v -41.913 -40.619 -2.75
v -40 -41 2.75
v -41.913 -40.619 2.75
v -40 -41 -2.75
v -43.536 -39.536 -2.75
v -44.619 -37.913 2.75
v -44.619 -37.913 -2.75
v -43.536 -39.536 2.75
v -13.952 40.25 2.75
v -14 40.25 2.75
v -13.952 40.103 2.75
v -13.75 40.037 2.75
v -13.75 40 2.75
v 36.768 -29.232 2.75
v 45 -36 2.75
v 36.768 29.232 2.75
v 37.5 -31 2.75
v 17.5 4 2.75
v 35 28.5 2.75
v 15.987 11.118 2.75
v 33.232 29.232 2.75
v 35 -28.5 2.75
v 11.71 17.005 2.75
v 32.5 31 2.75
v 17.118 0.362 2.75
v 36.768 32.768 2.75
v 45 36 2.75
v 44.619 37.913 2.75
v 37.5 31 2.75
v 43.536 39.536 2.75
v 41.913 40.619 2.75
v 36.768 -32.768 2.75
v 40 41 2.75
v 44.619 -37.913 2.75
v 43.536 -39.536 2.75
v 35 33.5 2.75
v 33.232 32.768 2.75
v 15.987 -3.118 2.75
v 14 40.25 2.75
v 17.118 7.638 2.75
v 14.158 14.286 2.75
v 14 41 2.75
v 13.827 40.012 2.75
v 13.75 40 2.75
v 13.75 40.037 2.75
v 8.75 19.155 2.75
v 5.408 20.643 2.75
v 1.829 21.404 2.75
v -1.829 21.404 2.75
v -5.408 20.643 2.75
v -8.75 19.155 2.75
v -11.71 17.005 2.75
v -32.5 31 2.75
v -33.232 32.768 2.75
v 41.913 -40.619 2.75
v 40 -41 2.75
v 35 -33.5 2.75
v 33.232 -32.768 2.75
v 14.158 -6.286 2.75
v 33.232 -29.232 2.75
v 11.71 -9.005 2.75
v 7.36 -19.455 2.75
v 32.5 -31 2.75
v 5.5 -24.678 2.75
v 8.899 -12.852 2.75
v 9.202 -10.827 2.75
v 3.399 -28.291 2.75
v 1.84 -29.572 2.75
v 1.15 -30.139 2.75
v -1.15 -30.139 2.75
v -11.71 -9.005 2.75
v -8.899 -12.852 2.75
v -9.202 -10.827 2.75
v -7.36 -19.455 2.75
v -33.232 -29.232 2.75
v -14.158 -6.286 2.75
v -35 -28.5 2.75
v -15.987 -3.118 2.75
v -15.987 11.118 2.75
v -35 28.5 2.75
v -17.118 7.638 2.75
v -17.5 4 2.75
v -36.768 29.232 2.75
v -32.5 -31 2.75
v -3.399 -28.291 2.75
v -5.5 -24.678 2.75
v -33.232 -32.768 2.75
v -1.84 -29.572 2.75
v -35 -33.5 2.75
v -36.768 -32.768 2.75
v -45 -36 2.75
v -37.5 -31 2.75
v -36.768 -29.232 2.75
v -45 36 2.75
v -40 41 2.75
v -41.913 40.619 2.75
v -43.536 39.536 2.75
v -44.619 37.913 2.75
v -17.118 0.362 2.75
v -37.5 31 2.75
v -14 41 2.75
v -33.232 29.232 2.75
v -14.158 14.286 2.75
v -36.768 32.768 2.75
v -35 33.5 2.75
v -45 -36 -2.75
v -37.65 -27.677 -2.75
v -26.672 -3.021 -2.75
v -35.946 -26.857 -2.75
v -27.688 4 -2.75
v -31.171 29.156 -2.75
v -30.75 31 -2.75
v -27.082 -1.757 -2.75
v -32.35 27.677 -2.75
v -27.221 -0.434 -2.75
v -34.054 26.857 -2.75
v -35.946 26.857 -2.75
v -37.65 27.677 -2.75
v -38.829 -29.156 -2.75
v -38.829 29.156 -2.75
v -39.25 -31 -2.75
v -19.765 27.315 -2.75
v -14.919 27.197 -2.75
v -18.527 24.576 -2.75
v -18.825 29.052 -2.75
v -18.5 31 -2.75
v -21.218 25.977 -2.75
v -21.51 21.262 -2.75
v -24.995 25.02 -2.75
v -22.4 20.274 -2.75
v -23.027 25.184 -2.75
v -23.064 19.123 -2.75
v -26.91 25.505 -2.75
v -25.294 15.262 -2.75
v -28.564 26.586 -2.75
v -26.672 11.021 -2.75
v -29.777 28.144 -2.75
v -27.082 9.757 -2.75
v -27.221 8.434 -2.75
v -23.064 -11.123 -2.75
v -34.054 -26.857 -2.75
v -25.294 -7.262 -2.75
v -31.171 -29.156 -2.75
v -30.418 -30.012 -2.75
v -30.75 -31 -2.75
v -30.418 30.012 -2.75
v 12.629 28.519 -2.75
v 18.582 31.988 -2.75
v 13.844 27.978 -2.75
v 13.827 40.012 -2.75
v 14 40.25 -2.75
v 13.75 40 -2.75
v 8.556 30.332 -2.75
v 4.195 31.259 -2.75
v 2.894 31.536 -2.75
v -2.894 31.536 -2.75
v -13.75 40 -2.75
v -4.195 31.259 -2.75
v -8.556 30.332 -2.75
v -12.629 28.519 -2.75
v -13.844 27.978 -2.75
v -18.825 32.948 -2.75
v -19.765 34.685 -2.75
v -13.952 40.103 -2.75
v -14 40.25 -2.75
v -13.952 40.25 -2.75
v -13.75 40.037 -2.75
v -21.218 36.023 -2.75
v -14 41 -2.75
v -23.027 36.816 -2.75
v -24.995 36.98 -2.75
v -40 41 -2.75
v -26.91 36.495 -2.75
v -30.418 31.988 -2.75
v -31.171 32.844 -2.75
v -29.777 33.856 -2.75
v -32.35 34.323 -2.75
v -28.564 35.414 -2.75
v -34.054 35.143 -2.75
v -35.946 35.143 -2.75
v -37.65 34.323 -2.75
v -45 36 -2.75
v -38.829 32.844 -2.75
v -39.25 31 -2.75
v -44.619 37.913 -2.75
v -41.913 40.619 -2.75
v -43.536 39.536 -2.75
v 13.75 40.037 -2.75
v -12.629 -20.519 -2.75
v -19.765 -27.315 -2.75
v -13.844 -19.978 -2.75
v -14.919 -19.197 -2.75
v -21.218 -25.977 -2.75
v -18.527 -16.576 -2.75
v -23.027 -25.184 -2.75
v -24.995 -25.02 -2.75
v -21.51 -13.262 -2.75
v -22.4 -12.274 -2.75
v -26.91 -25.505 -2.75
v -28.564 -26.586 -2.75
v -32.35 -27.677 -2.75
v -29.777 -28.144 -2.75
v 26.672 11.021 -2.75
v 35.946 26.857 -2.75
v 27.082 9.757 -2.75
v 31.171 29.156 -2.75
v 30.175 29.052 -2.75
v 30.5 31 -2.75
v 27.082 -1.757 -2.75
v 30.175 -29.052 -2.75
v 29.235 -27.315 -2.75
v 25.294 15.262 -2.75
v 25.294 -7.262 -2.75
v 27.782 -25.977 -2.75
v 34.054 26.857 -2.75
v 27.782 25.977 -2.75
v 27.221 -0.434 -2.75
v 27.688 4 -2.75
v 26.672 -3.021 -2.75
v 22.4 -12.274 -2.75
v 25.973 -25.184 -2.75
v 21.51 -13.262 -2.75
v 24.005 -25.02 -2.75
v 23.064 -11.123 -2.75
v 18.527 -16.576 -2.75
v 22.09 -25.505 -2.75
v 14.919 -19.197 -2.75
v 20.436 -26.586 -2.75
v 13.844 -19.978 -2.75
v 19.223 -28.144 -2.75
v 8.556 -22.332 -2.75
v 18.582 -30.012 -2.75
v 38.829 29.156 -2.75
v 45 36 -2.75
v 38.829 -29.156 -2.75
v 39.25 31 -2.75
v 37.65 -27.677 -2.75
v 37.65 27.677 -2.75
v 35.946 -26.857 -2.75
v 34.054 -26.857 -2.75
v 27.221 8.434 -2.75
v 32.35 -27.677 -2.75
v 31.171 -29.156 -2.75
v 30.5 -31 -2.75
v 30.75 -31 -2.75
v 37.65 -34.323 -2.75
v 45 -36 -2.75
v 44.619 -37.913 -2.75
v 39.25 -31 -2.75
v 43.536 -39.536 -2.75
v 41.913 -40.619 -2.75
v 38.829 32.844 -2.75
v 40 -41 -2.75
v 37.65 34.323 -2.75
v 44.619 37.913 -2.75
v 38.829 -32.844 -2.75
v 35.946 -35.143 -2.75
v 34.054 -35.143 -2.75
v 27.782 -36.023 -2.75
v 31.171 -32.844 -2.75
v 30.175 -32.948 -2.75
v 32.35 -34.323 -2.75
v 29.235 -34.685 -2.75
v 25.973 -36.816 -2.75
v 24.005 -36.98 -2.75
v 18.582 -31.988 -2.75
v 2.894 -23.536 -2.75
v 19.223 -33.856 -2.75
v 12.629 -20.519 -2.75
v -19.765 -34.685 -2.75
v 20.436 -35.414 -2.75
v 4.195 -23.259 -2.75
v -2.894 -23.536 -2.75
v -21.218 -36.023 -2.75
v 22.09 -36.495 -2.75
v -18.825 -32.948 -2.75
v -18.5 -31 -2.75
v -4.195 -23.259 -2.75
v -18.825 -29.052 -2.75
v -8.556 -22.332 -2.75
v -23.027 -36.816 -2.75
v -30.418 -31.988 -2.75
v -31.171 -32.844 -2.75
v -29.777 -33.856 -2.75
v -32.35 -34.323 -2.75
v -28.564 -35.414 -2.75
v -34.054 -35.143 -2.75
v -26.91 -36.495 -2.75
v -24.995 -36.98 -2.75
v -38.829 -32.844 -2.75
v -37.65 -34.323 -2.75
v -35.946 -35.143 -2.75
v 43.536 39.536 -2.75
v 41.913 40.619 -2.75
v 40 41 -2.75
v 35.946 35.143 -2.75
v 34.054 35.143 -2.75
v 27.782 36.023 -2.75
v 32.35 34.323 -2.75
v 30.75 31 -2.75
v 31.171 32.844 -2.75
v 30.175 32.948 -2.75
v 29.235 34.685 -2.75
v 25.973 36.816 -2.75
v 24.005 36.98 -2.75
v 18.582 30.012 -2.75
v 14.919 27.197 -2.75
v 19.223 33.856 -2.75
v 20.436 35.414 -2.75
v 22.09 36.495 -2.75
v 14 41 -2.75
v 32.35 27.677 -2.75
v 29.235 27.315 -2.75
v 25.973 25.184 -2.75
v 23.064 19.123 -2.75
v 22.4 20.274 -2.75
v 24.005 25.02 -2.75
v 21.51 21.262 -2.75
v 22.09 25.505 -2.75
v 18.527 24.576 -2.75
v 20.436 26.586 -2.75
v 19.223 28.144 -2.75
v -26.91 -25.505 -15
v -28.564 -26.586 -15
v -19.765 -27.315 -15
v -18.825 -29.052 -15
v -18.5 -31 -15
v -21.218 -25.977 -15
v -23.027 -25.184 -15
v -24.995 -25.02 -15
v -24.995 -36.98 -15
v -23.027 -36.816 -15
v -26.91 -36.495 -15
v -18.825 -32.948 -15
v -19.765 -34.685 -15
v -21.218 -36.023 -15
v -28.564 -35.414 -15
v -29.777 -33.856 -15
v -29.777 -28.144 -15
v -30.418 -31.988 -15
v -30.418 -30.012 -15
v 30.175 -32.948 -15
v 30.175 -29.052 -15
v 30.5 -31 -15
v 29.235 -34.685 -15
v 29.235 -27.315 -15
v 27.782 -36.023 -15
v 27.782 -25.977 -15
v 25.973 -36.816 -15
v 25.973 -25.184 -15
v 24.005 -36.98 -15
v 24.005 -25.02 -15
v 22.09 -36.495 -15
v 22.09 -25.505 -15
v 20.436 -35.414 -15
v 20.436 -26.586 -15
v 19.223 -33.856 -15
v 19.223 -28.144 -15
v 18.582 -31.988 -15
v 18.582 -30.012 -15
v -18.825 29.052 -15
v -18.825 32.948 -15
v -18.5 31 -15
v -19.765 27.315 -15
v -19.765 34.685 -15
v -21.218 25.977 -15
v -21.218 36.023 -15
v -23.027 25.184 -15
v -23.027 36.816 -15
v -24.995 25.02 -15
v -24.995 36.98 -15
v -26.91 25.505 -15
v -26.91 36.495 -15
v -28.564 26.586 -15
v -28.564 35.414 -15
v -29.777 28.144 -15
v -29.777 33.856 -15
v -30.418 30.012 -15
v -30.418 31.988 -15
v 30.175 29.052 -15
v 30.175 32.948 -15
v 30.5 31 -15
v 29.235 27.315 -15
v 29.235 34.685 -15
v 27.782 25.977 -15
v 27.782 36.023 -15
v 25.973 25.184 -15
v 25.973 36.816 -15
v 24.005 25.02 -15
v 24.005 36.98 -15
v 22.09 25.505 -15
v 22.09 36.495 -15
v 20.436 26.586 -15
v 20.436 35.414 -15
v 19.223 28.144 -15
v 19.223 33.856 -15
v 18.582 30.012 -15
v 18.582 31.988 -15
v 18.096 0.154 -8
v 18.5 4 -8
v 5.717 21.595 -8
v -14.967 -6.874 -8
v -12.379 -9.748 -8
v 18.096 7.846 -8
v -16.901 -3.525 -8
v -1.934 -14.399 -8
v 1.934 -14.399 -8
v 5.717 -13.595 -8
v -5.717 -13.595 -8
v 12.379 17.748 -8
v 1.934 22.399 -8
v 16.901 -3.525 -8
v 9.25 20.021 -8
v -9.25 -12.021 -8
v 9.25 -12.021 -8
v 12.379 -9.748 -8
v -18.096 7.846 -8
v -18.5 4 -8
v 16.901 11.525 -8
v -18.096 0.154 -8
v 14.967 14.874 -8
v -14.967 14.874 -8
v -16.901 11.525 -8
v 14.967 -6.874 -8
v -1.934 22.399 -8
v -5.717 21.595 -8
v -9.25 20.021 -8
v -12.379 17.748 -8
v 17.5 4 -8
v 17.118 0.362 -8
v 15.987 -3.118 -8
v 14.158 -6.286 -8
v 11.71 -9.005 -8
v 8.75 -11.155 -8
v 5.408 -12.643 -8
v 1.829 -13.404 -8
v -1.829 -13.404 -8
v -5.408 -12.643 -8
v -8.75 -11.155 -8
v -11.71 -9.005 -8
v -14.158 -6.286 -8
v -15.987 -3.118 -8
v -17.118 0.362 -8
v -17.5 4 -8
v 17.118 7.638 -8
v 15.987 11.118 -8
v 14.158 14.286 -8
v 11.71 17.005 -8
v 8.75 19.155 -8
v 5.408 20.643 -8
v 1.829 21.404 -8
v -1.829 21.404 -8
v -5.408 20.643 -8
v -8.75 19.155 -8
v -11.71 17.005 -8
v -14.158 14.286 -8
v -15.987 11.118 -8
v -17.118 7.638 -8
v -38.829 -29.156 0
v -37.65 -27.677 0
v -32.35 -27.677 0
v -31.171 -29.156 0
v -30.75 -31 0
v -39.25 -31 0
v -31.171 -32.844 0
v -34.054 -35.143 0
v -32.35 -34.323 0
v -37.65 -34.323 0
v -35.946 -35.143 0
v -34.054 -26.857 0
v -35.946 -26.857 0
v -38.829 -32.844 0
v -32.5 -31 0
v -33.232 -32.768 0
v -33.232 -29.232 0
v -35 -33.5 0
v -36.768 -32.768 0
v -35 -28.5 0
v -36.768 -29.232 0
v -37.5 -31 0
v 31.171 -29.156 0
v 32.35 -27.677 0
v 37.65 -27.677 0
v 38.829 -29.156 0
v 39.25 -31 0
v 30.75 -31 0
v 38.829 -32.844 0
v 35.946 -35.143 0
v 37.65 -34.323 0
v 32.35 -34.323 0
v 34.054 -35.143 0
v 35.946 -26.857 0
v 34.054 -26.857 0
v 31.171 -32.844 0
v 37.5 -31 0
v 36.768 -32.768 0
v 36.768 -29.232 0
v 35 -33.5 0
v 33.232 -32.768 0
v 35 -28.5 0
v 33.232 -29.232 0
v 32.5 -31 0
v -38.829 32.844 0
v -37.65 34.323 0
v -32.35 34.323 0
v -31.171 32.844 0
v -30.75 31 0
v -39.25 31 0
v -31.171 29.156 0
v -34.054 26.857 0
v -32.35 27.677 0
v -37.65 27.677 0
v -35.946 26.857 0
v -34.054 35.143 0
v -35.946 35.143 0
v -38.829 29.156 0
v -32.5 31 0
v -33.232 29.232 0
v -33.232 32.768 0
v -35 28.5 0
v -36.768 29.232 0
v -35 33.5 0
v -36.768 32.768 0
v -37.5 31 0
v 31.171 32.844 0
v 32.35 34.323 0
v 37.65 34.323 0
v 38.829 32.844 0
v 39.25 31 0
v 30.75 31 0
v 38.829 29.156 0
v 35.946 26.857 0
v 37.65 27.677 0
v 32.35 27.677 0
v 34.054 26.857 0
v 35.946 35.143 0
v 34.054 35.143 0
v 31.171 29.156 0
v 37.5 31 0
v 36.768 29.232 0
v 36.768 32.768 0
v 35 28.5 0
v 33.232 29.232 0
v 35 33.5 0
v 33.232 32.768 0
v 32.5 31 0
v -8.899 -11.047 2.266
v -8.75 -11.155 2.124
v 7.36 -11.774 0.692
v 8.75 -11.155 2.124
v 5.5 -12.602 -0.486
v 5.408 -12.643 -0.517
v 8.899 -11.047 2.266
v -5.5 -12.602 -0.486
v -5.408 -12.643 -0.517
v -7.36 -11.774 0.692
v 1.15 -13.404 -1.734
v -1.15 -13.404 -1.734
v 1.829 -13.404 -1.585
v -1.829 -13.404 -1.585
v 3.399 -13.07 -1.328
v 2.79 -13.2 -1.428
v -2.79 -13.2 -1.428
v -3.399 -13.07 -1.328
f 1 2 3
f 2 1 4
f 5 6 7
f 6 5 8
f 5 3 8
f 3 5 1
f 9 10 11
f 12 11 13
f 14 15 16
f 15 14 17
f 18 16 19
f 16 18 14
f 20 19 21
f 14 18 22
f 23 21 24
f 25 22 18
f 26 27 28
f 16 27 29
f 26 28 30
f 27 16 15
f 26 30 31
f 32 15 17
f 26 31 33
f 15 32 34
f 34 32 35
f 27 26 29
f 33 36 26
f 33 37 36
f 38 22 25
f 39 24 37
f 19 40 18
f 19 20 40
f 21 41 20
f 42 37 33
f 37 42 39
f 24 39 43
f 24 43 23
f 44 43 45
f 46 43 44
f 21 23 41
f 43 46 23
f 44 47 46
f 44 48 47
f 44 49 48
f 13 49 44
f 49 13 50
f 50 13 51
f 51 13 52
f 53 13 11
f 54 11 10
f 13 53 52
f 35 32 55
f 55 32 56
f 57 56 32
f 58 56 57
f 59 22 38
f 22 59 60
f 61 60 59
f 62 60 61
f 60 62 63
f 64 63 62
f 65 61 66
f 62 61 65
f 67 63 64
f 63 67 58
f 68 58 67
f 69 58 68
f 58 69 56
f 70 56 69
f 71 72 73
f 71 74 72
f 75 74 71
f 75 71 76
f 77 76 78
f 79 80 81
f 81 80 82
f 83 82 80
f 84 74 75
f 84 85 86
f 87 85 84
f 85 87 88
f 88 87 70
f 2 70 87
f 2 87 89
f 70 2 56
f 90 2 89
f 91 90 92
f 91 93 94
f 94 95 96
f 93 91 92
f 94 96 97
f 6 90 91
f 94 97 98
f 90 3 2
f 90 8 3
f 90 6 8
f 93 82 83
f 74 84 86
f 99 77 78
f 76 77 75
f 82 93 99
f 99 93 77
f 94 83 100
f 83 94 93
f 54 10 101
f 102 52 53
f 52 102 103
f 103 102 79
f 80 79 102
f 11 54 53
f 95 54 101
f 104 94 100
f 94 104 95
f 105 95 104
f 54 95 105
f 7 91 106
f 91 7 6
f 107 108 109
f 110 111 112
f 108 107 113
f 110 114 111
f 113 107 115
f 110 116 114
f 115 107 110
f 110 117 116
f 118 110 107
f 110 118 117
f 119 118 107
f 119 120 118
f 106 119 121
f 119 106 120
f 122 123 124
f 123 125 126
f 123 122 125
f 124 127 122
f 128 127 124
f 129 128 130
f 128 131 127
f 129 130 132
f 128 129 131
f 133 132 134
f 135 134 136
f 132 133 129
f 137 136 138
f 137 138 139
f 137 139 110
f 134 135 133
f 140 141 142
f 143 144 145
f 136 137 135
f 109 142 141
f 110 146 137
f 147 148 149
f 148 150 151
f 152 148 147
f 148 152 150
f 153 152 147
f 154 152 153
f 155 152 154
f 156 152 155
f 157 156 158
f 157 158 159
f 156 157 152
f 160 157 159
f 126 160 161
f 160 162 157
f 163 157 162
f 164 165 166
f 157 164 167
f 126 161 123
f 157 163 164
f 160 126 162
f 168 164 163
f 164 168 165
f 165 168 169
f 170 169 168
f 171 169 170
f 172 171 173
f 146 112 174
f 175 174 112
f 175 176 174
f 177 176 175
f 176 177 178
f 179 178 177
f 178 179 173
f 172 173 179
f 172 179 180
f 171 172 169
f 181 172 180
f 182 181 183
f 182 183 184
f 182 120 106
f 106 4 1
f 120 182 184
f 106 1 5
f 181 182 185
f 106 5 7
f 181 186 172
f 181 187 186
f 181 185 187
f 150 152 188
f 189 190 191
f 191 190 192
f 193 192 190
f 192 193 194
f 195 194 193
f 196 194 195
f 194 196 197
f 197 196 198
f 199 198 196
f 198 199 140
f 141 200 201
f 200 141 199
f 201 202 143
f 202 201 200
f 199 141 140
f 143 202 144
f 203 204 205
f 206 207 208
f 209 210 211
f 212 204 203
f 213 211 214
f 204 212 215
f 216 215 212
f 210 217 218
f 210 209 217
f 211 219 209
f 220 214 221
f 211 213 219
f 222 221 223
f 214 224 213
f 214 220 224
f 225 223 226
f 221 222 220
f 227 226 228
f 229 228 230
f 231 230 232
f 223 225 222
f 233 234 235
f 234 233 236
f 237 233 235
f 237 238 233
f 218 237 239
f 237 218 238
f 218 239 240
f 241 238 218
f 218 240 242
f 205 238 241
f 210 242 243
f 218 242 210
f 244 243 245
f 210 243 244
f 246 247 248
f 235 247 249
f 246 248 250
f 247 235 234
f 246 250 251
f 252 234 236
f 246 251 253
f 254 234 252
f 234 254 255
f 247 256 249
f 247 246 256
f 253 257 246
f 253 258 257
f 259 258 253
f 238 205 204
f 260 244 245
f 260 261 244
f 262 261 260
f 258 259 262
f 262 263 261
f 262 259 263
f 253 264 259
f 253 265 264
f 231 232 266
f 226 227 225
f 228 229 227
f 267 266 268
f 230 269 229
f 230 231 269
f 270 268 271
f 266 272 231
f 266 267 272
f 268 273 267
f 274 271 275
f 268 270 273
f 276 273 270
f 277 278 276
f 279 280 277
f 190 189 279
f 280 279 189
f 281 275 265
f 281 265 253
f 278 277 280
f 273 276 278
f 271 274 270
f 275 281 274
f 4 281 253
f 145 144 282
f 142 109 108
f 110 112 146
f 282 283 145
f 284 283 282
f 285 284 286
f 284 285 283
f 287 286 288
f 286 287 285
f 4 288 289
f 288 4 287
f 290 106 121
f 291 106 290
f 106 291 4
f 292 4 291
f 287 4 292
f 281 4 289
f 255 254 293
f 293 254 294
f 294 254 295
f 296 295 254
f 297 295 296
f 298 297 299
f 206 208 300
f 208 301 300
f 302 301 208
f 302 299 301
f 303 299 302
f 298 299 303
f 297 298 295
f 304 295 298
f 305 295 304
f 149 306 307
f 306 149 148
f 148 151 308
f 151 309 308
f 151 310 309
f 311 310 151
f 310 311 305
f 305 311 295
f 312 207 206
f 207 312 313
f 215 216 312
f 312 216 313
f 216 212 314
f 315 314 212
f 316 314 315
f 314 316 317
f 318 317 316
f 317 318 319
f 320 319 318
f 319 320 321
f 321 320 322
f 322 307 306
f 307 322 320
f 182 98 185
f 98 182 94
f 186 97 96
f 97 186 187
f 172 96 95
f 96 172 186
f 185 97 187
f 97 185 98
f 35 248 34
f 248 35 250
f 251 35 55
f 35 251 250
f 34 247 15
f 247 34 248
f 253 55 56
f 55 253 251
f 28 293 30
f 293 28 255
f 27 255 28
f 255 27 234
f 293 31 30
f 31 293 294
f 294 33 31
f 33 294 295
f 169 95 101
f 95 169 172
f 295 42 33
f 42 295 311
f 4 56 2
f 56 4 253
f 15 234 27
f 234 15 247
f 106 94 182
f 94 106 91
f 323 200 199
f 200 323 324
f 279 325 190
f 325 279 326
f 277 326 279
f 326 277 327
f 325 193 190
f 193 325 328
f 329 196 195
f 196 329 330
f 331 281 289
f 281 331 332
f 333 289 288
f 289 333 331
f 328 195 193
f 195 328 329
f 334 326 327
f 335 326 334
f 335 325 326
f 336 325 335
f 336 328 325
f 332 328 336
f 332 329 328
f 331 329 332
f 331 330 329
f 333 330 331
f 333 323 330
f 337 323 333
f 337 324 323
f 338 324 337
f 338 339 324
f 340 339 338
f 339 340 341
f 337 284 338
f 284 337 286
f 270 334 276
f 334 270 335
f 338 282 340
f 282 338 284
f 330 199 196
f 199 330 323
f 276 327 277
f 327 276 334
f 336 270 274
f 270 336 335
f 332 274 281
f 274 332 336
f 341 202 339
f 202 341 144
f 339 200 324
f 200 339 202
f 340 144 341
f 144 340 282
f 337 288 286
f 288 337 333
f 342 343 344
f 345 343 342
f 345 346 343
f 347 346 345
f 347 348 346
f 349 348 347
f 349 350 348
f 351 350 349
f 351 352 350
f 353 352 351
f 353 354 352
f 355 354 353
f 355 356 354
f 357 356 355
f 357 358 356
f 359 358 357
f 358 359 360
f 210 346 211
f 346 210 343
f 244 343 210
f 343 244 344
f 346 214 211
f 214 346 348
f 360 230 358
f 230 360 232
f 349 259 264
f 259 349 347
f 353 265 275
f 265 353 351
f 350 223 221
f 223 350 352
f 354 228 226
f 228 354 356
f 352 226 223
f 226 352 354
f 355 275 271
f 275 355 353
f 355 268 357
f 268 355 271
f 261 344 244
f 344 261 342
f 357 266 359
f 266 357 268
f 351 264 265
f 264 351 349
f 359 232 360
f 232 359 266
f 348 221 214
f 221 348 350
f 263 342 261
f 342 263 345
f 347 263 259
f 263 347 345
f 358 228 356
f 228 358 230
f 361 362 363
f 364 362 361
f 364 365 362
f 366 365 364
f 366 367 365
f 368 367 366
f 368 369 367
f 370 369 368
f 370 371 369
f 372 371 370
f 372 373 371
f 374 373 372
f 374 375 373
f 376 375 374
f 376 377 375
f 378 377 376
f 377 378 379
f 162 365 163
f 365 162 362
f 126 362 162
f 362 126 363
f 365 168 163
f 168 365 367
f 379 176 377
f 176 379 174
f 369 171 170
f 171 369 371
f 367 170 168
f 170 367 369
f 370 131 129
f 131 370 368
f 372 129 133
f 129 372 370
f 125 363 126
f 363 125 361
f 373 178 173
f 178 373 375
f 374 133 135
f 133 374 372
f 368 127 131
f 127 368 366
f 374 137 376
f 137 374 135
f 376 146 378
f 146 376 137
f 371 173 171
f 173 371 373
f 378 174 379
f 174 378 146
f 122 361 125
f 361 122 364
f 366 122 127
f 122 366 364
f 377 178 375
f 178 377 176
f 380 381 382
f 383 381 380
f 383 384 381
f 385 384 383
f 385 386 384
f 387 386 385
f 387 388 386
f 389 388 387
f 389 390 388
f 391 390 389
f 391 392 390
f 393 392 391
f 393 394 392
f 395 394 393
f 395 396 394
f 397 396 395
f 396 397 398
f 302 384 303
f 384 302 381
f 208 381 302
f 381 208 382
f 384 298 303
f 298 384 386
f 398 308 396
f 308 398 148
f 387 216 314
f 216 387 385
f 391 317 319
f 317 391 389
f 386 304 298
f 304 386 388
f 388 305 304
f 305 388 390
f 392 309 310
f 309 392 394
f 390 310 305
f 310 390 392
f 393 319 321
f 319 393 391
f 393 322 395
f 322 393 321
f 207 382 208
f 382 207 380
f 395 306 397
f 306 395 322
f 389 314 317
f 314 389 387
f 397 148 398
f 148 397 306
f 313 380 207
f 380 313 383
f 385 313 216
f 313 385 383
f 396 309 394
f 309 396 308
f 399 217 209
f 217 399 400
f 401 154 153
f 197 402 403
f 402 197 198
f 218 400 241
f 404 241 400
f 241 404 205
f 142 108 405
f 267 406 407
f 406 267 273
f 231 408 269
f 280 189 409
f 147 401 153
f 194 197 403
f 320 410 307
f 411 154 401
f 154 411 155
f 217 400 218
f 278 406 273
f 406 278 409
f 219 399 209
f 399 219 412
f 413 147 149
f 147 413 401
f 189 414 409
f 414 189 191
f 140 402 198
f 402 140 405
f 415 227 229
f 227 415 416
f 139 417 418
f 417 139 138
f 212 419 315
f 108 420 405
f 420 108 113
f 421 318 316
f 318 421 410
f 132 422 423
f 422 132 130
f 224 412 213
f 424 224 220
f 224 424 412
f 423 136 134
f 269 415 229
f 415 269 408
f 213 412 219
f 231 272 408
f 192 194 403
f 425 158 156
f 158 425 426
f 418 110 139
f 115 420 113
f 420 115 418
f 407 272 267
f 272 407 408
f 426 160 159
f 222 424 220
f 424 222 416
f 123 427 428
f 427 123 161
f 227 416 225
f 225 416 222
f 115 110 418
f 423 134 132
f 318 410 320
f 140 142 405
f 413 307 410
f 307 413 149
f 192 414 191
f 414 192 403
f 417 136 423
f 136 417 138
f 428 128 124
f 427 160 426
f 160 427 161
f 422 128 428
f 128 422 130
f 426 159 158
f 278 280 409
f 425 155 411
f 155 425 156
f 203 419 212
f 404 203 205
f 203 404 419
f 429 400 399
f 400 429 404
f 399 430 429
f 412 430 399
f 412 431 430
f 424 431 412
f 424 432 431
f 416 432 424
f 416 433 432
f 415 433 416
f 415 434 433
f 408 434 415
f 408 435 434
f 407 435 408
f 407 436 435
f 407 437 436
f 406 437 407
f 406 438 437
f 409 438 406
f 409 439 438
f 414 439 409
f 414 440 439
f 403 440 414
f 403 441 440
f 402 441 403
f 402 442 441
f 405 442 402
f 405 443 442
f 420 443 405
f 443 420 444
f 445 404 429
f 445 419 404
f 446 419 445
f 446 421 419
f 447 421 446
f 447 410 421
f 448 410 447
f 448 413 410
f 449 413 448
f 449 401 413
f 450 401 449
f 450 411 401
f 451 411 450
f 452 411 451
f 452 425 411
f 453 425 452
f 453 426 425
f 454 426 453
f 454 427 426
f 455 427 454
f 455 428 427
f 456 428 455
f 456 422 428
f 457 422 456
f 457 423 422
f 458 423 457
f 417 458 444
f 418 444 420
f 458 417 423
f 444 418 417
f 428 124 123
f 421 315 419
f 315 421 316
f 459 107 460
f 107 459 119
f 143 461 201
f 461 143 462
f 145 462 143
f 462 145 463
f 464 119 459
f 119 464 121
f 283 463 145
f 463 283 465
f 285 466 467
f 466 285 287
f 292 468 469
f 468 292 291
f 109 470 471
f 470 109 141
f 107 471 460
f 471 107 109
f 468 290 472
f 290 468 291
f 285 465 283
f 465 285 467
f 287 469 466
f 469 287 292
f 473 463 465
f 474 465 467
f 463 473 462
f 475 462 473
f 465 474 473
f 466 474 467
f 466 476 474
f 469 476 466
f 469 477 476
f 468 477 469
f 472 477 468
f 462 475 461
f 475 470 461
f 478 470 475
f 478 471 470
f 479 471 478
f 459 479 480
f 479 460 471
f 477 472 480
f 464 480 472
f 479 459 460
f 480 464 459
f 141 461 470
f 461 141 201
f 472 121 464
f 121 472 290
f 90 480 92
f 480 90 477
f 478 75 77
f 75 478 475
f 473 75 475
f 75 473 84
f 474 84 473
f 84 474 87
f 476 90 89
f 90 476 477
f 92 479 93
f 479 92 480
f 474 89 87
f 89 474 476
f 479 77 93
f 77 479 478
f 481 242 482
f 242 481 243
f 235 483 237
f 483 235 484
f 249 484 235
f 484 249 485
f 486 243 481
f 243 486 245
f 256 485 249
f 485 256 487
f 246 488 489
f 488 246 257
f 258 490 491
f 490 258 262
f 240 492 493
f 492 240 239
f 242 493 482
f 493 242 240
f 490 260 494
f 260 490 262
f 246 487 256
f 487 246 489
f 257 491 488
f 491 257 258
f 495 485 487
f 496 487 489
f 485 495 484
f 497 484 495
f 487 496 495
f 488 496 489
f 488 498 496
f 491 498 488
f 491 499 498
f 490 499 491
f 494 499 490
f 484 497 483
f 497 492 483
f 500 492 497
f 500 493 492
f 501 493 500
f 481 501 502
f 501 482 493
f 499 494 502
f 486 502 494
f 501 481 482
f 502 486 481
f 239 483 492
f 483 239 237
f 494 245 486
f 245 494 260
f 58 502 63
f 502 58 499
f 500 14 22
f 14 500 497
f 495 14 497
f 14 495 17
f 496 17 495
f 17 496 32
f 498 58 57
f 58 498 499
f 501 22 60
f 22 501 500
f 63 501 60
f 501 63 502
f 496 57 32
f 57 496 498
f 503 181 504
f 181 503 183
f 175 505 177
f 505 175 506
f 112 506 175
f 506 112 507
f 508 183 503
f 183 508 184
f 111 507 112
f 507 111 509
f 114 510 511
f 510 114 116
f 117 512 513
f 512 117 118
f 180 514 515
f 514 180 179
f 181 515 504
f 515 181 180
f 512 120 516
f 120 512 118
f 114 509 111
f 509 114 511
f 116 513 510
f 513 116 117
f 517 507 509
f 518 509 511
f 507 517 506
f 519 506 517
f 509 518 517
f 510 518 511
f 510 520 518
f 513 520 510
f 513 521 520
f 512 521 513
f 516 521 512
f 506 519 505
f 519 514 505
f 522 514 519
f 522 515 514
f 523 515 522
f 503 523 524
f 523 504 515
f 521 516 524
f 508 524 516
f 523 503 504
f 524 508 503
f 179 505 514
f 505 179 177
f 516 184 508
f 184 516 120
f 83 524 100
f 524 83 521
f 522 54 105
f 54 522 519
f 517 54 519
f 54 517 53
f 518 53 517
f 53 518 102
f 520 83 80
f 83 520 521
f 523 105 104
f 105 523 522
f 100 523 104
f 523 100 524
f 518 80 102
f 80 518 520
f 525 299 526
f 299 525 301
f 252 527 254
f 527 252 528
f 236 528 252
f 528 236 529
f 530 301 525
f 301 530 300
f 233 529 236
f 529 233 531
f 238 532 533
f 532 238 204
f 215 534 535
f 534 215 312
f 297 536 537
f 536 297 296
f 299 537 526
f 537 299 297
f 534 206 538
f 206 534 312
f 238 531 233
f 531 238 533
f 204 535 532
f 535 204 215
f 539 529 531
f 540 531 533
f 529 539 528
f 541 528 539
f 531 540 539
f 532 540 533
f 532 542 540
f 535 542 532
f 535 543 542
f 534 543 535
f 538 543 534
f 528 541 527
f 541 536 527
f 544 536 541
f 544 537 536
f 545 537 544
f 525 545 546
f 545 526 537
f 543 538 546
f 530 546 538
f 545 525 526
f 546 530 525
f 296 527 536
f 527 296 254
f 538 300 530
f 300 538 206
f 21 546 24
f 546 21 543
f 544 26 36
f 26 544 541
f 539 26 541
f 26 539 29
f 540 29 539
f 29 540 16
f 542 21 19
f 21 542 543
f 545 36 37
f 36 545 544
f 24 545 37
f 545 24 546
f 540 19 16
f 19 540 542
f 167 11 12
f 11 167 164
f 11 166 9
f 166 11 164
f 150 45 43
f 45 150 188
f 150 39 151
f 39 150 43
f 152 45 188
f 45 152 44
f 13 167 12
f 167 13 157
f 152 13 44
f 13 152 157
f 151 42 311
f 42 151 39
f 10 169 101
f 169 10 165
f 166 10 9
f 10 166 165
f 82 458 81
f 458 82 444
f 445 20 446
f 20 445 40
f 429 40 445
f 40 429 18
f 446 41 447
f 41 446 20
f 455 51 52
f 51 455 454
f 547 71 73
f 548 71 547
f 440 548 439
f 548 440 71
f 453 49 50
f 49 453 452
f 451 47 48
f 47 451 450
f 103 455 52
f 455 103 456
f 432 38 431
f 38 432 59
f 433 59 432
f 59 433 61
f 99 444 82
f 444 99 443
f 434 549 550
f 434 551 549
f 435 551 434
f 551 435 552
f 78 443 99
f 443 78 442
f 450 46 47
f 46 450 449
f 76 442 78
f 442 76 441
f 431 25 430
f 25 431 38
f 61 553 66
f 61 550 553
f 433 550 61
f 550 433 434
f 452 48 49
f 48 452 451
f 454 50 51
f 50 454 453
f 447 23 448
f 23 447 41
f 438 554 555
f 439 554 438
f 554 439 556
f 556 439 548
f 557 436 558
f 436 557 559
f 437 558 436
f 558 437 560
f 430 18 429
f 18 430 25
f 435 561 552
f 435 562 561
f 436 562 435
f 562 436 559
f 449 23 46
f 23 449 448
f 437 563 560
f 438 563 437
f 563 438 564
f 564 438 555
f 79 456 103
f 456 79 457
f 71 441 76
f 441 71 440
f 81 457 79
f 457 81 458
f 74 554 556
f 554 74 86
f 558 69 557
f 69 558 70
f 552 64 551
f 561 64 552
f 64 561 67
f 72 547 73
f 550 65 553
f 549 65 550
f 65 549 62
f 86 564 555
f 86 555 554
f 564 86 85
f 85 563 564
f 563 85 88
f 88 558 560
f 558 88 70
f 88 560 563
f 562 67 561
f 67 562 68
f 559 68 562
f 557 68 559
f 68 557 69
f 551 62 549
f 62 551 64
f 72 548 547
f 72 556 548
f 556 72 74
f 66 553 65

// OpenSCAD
use <MCAD/shapes.scad>

// makita 3709
// guide for following linear part
guide_size=37;

guide_diameter=12;
guide_height=15;
guide_spacing=guide_size+guide_diameter;


// plate is attached by four screws
// 90x82mm square plate
// attached by four screws in square pattern with 70x62mm pattern

plate_length=90;
plate_width=82;
plate_height=5.5;

screw_layout_length=70;
screw_layout_width=62;
screw_recess_diameter=8.5;
screw_through_diameter=5;

main_hole_diameter=35;
main_hole_offset=4;

air_guide_diameter=22;

notch_length=28;

screw_layout=[
    [-screw_layout_length/2,-screw_layout_width/2],
    [ screw_layout_length/2,-screw_layout_width/2],
    [-screw_layout_length/2, screw_layout_width/2],
    [ screw_layout_length/2, screw_layout_width/2]];

guide_layout=[
    [-guide_spacing/2,-screw_layout_width/2,-guide_height],
    [ guide_spacing/2,-screw_layout_width/2,-guide_height],
    [-guide_spacing/2, screw_layout_width/2,-guide_height],
    [ guide_spacing/2, screw_layout_width/2,-guide_height]];

difference() {
    union() {
        roundedBox(plate_length, plate_width, plate_height, 5);
        for(v = guide_layout) translate(v) cylinder(d=guide_diameter, h=guide_height);
        translate([0,main_hole_offset,-8]) cylinder(d1=guide_size,d2=main_hole_diameter+30,h=8);
    }

    for(v = screw_layout) {
        translate(v) {
            translate([0,0,-10]) cylinder(d=screw_recess_diameter, h=10);
            translate([0,0,-5]) cylinder(d=screw_through_diameter, h=10);
        }
    }
    translate([0,main_hole_offset,-20]) cylinder(d=main_hole_diameter, h=40);
    translate([0,0,6]) rotate([75,0]) cylinder(d=air_guide_diameter,h=40);
translate([0,plate_width/2,0]) roundedBox(notch_length, 2, 2*plate_height, 0.25);
}
